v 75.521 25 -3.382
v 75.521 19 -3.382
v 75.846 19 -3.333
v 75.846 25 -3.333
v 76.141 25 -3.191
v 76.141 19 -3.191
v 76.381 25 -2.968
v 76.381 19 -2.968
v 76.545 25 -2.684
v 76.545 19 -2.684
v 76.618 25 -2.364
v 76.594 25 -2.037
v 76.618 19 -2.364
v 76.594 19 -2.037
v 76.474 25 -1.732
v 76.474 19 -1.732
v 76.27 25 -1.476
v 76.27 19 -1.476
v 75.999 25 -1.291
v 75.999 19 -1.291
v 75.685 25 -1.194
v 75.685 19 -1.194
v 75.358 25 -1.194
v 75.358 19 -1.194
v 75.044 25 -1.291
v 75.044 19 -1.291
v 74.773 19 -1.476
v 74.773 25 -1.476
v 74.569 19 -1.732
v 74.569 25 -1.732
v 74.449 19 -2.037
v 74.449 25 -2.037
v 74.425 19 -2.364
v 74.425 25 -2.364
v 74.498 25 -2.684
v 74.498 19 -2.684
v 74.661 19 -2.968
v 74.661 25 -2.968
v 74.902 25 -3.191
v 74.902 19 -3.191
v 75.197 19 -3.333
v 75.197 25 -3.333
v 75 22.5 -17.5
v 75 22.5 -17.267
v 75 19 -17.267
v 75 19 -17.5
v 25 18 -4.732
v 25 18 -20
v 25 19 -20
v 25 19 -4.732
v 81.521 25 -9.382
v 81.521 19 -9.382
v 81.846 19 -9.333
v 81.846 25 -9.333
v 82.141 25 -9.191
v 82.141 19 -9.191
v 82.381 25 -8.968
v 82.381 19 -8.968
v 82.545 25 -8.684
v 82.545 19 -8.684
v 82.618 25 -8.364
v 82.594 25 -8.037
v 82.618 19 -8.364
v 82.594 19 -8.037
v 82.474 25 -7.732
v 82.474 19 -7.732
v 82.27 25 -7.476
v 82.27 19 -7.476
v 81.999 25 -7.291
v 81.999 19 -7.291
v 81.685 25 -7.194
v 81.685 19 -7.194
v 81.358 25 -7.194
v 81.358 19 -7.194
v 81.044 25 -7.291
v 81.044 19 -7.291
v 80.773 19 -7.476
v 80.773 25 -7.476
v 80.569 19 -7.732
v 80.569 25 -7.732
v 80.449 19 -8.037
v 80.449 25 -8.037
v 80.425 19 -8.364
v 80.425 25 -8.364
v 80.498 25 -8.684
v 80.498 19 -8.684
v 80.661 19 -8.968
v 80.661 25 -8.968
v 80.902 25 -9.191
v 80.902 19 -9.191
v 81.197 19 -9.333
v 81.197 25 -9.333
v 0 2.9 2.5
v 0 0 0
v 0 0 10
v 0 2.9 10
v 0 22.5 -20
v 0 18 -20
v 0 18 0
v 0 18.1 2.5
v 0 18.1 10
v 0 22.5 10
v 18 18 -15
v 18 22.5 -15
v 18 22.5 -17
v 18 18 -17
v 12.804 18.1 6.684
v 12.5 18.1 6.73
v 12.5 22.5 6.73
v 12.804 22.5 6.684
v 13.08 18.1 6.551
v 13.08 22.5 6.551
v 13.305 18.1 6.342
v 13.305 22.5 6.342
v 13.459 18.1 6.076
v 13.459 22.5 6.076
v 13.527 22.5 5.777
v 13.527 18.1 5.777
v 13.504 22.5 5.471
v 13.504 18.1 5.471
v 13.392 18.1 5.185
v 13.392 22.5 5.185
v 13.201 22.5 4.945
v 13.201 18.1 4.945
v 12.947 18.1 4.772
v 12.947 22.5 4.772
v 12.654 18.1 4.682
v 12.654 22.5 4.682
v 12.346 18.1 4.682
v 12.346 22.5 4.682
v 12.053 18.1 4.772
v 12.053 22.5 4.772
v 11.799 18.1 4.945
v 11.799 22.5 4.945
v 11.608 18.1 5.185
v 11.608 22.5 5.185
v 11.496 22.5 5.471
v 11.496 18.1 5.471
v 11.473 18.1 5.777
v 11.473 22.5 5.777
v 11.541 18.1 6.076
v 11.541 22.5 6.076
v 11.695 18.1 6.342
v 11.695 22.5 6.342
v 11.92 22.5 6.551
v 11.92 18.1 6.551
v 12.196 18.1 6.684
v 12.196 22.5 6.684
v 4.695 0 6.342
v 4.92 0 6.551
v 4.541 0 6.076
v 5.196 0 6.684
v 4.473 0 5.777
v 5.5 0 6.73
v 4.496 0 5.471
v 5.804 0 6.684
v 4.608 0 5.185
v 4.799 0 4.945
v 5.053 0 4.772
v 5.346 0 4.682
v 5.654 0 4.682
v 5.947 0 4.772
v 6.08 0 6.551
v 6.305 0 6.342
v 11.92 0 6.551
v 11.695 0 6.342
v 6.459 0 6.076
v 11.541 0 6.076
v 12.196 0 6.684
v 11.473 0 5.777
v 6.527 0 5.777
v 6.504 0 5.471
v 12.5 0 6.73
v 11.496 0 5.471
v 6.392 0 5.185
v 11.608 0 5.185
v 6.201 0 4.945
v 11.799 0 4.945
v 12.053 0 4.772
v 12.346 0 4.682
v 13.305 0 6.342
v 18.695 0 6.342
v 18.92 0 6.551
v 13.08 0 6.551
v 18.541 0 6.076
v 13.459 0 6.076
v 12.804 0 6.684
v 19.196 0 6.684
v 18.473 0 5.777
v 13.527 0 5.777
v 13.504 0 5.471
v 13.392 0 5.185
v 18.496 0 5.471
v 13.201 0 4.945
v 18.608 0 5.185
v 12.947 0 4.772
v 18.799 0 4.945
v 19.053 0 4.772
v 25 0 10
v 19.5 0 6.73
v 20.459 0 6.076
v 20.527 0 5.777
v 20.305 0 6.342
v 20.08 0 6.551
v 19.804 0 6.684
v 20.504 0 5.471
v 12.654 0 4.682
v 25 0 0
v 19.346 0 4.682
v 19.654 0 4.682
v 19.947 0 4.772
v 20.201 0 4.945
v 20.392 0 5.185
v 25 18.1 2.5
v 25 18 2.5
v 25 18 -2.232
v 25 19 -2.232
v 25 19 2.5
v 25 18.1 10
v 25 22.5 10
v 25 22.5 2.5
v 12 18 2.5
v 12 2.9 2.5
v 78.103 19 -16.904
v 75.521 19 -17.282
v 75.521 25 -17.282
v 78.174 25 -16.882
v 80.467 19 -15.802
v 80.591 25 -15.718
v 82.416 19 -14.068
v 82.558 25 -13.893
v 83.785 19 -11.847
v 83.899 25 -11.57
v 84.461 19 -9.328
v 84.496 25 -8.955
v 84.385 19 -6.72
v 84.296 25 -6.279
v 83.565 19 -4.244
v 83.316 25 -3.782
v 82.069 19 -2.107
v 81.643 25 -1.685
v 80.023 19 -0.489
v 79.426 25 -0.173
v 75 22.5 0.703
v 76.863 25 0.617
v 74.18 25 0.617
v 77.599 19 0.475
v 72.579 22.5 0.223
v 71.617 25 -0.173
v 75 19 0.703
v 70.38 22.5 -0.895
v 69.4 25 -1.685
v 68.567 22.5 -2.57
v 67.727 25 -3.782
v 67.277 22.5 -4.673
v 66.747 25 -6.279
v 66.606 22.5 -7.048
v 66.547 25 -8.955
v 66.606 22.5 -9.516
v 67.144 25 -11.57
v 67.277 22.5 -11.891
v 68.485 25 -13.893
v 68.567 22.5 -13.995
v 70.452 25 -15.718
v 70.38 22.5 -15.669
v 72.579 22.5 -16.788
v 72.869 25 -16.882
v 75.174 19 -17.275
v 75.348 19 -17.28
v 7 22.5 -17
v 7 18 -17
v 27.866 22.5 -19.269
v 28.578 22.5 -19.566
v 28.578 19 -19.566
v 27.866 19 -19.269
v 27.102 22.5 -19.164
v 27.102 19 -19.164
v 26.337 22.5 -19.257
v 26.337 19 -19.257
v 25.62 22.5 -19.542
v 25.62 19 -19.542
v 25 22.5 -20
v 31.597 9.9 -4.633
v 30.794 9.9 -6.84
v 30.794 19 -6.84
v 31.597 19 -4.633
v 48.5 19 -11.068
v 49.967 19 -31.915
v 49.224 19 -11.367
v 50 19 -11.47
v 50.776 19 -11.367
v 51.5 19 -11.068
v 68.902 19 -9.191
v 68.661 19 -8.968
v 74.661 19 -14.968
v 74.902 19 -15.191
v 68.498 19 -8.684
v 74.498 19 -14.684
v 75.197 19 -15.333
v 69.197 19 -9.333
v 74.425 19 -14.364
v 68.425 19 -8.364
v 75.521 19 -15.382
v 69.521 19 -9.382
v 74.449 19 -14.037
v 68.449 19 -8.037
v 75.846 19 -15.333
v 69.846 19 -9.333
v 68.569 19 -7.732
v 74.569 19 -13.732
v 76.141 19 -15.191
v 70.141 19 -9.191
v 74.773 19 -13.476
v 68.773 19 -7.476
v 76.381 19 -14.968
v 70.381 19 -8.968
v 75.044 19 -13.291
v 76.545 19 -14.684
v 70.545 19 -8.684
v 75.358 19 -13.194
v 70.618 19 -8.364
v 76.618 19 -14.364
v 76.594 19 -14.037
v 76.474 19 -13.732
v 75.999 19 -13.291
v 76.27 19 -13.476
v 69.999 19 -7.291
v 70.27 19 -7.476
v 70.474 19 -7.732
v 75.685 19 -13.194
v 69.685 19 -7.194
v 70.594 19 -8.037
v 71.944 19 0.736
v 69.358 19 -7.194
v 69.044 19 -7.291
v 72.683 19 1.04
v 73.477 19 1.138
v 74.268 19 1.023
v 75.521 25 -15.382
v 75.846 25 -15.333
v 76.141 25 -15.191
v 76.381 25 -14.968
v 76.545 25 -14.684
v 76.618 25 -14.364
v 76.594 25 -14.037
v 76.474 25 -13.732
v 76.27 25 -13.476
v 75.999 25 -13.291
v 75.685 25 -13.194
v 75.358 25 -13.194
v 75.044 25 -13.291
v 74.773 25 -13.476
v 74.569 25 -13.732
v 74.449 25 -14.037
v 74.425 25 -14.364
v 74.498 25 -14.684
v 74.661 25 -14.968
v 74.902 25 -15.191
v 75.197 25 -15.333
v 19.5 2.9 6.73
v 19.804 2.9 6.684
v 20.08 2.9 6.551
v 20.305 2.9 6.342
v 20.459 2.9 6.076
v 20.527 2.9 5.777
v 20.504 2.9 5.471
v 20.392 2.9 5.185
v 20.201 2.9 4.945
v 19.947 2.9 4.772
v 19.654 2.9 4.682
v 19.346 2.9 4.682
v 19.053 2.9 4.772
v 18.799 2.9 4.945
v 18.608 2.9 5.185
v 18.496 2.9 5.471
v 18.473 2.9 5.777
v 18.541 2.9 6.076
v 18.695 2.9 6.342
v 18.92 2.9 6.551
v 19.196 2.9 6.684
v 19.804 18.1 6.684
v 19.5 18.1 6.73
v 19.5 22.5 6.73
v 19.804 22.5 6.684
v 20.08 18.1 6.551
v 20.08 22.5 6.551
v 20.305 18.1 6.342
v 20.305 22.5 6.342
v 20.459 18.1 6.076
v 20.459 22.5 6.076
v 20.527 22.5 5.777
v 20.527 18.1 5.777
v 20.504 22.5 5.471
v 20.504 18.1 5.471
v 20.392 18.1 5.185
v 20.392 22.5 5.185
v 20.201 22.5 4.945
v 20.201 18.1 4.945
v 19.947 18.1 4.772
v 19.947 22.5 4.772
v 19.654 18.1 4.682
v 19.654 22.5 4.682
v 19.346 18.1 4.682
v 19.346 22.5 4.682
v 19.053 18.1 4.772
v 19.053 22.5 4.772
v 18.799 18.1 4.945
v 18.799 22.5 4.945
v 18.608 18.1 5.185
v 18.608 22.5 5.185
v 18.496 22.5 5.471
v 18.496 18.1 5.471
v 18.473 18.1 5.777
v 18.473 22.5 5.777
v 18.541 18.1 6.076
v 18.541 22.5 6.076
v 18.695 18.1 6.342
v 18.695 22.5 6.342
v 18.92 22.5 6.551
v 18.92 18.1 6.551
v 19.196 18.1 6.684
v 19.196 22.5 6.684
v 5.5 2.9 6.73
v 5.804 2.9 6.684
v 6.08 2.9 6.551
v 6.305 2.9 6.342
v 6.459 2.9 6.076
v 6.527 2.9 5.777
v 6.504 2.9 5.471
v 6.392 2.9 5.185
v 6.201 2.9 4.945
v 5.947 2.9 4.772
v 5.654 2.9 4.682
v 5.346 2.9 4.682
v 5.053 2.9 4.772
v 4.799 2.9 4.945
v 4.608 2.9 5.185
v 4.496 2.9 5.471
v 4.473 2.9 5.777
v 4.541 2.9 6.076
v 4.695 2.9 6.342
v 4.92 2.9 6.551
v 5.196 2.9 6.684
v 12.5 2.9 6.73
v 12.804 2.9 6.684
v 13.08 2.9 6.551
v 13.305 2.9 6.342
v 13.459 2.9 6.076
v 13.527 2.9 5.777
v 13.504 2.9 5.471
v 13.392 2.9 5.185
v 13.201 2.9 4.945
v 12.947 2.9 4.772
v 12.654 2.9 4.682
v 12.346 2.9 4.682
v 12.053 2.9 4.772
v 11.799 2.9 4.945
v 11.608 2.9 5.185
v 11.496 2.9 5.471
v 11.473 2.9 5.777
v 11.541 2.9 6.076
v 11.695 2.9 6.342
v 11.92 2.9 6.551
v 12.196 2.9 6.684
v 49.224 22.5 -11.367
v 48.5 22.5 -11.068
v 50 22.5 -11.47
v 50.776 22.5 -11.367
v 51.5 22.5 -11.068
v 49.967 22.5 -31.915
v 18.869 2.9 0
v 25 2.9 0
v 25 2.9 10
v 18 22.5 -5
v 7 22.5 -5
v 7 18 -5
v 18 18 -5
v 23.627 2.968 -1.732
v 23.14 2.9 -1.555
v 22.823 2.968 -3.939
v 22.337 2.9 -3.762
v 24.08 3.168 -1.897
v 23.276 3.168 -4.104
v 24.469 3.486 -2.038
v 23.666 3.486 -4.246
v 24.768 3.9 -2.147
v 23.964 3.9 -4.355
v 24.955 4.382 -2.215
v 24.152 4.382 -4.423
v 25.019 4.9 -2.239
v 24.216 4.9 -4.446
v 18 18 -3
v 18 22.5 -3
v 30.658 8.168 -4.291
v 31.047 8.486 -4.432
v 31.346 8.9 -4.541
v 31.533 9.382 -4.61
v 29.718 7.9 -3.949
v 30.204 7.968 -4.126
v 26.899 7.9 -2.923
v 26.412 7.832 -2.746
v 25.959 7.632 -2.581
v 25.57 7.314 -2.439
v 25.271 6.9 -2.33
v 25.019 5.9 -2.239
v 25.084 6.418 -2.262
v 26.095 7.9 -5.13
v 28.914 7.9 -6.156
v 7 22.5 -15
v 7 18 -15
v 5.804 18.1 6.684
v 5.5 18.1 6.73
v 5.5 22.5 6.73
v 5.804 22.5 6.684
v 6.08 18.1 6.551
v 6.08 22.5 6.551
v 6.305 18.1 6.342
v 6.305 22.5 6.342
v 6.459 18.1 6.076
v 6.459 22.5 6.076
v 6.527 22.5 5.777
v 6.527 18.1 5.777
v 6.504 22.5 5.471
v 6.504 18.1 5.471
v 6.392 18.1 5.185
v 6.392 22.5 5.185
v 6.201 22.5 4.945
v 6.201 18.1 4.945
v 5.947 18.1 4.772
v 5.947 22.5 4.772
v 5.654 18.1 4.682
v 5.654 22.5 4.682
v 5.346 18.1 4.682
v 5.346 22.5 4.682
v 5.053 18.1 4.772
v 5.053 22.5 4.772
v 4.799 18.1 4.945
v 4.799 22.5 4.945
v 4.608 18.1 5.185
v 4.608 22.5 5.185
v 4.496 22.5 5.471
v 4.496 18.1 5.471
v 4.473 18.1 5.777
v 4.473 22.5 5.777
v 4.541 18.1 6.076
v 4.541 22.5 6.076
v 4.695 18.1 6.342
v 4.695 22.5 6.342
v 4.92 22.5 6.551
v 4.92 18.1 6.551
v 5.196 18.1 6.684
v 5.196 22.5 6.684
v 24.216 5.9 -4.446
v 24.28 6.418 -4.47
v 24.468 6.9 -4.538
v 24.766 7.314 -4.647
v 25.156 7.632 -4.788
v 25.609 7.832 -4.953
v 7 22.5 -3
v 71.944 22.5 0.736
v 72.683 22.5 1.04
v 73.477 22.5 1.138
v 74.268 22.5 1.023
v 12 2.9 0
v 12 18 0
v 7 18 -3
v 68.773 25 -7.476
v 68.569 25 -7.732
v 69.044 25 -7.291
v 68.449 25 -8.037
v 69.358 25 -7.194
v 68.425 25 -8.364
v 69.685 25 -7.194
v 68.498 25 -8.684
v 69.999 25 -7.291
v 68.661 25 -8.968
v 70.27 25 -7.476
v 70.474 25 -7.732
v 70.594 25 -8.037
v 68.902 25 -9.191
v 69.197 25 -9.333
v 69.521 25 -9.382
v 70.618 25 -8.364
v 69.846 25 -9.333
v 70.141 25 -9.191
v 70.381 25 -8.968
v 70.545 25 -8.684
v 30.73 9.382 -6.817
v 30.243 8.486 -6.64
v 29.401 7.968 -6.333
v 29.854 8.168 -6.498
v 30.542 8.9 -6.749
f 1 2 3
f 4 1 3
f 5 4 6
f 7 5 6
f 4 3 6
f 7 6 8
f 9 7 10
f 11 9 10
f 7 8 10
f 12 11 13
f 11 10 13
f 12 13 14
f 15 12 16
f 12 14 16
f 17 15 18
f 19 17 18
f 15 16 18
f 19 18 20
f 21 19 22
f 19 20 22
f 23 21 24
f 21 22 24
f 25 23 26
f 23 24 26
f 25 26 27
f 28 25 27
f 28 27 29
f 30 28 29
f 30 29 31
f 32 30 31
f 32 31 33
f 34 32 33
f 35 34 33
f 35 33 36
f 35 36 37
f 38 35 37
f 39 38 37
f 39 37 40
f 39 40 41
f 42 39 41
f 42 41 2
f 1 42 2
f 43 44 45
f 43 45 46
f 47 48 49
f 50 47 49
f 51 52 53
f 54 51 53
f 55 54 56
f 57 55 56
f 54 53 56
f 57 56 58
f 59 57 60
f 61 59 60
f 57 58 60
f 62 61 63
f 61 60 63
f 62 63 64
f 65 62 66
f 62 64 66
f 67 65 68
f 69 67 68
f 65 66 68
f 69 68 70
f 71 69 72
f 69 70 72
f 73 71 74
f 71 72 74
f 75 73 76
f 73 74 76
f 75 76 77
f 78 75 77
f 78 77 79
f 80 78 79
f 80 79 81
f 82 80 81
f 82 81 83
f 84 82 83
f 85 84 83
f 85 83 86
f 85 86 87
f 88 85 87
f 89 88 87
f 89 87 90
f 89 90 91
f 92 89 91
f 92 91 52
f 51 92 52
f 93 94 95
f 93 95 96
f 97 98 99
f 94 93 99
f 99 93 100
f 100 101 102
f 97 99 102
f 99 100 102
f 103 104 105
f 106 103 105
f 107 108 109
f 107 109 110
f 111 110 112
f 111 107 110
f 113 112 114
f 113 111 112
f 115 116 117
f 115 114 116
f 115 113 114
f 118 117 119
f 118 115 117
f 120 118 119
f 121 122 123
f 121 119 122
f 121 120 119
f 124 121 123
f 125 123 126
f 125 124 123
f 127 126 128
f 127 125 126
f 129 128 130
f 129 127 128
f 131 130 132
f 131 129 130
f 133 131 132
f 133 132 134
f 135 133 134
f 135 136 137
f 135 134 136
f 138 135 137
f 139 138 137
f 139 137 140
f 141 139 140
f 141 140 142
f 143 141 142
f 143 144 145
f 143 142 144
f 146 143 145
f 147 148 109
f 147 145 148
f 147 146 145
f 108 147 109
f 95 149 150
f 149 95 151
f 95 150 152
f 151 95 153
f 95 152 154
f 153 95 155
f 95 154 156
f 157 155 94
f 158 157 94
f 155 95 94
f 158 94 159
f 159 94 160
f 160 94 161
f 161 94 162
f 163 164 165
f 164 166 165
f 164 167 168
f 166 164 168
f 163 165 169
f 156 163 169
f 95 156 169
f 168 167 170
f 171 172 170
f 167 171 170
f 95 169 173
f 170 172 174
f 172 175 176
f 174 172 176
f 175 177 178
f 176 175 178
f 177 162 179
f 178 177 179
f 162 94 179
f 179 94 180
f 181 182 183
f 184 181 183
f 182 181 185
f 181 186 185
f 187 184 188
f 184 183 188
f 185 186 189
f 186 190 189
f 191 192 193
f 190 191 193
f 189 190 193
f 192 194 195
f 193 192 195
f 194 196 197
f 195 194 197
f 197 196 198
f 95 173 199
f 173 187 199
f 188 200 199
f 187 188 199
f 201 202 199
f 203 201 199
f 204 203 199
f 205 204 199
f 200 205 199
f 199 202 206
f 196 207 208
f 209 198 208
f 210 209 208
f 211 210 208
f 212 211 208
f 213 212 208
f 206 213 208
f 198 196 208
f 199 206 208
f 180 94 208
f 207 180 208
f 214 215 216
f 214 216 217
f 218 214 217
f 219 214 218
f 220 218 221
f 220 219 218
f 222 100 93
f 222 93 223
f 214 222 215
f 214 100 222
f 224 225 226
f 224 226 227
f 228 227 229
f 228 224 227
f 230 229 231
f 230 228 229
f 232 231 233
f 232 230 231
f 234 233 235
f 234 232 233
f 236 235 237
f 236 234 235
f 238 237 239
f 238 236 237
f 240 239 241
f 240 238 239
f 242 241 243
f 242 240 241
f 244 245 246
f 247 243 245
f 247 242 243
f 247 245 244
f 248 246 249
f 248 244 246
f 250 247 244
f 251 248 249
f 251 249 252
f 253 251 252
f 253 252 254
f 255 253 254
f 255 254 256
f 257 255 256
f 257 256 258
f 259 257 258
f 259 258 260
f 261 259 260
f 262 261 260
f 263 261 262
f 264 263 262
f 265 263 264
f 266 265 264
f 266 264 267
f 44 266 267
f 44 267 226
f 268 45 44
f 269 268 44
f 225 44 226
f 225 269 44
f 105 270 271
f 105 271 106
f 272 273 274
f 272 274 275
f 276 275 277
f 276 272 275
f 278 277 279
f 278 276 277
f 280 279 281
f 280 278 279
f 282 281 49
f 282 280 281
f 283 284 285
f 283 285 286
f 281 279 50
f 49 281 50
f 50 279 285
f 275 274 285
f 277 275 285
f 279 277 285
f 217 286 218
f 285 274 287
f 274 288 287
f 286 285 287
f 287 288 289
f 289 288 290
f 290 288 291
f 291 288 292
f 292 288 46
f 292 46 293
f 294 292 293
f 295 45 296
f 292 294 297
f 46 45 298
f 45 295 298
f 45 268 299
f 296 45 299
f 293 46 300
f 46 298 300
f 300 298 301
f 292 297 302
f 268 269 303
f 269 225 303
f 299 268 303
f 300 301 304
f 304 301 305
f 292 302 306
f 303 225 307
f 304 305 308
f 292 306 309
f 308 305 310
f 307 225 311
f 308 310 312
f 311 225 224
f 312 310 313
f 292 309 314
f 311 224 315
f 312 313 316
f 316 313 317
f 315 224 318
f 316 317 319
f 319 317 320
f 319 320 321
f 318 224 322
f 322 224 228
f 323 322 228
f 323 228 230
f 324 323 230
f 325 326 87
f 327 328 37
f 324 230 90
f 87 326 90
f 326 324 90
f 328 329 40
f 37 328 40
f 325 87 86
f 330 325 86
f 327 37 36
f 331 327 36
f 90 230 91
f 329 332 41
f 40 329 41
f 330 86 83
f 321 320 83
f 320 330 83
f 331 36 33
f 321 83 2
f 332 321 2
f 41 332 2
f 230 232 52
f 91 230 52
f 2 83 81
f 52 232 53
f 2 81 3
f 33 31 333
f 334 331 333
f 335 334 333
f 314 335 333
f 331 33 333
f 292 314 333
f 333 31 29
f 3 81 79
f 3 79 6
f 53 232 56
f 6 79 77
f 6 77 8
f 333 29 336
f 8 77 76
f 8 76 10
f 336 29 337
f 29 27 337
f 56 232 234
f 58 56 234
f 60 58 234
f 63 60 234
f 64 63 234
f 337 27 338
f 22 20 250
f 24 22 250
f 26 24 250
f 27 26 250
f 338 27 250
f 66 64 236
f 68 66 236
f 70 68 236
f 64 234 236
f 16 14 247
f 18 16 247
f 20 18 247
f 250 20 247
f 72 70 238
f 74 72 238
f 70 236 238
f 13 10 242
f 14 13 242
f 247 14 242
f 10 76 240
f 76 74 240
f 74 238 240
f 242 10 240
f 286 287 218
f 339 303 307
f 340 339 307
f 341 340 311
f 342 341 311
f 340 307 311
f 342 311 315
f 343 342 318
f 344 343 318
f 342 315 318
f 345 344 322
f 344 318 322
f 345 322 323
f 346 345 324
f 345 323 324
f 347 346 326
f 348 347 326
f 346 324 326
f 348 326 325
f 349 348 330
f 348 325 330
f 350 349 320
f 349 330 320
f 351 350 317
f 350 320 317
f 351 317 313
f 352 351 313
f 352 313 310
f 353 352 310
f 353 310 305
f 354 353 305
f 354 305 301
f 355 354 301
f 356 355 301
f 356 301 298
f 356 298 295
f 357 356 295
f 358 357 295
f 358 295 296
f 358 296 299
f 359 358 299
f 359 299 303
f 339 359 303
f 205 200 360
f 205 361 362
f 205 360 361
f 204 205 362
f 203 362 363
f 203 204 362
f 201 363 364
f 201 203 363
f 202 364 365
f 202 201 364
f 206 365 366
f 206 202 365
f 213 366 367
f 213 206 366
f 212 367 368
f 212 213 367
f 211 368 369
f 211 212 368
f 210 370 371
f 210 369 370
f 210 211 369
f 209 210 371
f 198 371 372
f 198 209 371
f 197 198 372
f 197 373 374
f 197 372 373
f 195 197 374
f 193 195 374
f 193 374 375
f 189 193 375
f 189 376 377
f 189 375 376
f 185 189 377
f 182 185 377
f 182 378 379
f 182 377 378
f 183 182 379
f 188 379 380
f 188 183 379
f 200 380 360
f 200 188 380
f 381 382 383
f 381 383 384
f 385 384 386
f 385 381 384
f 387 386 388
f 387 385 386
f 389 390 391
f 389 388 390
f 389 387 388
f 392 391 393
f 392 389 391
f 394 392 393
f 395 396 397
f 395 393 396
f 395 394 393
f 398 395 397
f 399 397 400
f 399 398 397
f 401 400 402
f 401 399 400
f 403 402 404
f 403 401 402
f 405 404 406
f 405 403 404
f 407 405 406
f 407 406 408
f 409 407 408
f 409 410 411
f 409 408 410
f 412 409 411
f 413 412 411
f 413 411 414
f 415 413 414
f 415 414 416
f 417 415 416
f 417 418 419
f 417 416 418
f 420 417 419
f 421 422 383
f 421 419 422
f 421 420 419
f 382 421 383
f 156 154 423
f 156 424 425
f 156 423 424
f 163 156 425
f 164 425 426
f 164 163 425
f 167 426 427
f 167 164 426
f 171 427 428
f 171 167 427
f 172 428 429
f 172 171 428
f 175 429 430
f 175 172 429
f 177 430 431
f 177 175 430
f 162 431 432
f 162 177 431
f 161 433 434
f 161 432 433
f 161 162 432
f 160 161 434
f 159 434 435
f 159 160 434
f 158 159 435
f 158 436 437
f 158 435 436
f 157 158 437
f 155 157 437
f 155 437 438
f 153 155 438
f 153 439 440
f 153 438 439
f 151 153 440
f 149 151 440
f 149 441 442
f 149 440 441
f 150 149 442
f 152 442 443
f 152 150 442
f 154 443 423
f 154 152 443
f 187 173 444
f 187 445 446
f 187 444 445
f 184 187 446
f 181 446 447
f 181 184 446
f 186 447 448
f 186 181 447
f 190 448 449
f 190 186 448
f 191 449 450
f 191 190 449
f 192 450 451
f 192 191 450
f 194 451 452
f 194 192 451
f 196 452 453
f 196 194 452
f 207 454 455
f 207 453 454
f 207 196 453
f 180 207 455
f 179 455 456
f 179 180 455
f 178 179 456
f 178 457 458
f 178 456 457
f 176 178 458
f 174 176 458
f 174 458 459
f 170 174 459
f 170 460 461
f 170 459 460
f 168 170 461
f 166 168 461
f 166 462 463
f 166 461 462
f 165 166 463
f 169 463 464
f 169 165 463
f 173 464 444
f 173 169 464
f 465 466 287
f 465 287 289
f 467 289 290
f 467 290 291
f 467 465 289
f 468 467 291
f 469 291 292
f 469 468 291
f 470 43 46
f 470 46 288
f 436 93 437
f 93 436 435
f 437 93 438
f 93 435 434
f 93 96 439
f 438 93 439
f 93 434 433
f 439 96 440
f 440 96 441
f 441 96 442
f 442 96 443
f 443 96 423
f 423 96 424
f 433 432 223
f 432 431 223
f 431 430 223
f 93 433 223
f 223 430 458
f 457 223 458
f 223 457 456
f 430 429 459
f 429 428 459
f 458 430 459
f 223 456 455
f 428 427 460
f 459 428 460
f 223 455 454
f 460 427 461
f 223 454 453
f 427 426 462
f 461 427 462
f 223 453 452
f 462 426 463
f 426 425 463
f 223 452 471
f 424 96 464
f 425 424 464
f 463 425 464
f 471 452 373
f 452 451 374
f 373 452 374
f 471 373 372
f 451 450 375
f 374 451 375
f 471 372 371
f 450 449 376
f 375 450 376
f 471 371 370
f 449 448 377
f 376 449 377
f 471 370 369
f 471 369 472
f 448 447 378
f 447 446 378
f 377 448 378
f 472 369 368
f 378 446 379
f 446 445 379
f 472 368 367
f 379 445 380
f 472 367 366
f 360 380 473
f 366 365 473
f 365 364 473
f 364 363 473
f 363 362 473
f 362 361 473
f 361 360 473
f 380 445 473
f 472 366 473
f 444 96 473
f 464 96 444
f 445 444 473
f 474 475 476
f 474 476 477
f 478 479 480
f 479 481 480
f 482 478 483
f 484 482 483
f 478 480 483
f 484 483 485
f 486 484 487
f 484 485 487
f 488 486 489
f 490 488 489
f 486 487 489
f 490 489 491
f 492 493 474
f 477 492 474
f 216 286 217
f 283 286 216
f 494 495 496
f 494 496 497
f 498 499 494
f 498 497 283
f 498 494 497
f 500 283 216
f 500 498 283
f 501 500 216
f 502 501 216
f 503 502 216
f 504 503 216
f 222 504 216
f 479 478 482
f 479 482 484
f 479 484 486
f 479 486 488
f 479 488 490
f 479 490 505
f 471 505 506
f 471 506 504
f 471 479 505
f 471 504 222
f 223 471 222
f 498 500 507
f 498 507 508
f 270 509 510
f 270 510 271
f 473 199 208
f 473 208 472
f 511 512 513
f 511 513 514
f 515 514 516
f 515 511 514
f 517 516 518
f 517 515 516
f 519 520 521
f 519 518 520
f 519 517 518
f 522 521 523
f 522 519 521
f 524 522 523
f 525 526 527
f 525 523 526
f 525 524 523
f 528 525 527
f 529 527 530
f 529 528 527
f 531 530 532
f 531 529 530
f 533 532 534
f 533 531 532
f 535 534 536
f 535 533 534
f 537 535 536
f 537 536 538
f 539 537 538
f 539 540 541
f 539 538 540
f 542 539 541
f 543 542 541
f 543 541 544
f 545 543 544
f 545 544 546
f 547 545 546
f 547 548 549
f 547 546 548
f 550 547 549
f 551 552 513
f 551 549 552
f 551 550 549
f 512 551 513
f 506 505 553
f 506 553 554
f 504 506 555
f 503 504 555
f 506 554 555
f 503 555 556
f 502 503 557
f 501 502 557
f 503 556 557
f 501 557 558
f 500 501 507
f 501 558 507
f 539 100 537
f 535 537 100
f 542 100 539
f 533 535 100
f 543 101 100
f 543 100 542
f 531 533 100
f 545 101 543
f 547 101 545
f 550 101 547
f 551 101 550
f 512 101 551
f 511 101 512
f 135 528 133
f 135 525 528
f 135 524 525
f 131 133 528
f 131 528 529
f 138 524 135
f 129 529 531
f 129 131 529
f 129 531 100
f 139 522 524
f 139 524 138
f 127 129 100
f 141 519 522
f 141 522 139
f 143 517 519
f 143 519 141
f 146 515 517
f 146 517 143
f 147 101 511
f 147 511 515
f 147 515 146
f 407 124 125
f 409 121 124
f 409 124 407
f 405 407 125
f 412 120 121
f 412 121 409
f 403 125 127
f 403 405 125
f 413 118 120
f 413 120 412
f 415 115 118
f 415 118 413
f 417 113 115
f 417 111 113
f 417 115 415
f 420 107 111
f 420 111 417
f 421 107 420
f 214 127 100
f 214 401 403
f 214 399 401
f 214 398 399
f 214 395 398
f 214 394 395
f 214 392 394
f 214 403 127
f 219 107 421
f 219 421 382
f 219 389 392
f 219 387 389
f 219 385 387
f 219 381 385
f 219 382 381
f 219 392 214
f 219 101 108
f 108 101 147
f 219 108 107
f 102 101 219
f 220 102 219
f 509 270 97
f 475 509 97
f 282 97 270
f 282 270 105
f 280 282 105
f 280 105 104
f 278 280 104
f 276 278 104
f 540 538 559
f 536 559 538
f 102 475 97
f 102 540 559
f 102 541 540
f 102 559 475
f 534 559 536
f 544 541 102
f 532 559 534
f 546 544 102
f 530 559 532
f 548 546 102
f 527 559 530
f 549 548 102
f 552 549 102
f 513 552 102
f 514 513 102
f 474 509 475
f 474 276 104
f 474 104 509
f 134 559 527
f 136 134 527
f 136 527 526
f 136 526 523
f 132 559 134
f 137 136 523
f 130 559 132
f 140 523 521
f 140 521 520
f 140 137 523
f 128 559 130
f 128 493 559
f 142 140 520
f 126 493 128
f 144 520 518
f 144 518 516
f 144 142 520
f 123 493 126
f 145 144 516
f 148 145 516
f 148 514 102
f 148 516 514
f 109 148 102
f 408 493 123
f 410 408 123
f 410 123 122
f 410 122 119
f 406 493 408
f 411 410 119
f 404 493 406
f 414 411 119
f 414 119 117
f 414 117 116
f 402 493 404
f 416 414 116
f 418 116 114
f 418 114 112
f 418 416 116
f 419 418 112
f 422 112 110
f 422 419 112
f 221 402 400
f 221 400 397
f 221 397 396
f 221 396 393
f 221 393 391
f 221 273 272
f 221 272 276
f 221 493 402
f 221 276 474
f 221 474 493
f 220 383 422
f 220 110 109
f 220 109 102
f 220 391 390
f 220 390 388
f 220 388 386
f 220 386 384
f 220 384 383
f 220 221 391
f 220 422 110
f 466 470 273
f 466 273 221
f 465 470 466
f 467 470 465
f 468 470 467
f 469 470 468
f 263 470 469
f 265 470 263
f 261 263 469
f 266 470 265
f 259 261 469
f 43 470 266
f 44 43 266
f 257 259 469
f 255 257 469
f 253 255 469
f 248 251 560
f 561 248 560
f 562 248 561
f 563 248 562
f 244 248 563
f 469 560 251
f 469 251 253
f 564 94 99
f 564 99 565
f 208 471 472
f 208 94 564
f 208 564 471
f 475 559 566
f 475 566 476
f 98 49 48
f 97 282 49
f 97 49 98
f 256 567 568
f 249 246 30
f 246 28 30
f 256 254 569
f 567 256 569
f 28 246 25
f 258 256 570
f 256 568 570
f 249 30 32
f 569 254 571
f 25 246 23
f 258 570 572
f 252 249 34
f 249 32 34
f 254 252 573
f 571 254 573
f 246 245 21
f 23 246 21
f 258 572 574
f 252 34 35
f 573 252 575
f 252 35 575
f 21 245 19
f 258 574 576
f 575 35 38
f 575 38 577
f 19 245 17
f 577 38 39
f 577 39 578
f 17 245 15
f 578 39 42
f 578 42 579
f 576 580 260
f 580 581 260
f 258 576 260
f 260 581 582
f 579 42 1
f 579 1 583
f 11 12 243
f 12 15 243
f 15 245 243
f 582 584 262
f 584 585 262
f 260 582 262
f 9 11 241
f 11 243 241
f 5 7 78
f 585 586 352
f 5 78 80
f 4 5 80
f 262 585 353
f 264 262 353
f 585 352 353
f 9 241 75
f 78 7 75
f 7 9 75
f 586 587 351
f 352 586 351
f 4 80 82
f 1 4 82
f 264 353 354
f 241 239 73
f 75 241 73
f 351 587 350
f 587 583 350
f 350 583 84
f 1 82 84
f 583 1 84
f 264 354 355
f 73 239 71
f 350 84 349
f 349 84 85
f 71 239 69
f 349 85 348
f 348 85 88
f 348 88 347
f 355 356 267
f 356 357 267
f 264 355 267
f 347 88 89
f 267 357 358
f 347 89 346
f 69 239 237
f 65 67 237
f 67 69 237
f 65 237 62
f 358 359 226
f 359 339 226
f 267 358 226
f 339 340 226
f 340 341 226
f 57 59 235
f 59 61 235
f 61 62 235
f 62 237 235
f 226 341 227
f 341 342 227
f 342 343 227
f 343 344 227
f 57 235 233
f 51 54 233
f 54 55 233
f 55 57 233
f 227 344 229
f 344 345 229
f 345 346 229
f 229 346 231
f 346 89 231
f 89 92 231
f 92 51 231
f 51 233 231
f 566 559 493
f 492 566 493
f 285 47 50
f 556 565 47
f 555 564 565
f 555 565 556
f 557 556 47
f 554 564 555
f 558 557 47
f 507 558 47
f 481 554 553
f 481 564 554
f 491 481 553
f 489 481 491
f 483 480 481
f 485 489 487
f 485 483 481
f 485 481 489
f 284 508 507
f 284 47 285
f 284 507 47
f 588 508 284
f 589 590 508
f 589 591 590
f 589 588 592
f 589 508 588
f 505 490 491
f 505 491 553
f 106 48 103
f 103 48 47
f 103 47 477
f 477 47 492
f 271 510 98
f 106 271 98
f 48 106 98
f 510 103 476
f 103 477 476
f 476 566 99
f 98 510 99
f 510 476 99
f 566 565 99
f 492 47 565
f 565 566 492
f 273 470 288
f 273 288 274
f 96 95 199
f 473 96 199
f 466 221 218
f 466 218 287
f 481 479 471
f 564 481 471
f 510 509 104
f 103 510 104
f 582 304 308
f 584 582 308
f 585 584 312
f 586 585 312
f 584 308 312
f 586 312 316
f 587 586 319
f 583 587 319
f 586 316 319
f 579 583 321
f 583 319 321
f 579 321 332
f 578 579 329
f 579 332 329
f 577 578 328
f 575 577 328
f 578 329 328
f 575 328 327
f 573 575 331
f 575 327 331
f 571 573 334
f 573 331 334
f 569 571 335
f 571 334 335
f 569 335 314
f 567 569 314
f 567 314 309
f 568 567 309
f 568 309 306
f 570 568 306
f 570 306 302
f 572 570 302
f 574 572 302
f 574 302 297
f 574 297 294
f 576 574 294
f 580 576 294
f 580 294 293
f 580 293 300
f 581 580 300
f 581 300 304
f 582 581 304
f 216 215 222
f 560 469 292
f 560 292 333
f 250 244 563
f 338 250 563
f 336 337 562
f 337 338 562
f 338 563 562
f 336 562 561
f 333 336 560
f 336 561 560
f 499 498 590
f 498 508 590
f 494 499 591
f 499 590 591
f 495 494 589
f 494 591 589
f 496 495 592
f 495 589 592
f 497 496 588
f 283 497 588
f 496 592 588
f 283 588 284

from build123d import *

# Parameters (mm, degrees)
SKETCH_1_W               = 25
SKETCH_1_H               = 10
EXTRUDE_1_DEPTH          = 22.5
SKETCH_2_W               = 25
SKETCH_2_H               = 15.2
CUT_EXTRUDE_1_DEPTH      = 7.5
CUT_EXTRUDE_2_DEPTH      = 36.089172119
CUT_EXTRUDE_2_DEPTH_BACK = 36.089172119
SKETCH_4_R               = 1.03
SKETCH_5_W               = 25
SKETCH_5_H               = 4.5
EXTRUDE_2_DEPTH          = 20
SKETCH_6_W               = 11
SKETCH_6_H               = 2
CUT_EXTRUDE_3_DEPTH      = 4.5
EXTRUDE_3_DEPTH          = 3.5
SKETCH_16_R              = 9
EXTRUDE_4_DEPTH          = 6
FILLET_1_R               = 3
CUT_EXTRUDE_4_REACH      = 94.322
SKETCH_17_R              = 1.1
SKETCH_19_W              = 13
SKETCH_19_H              = 15.1
CUT_EXTRUDE_5_DEPTH      = 10
EXTRUDE_5_REACH          = 95.01
CUT_EXTRUDE_6_REACH      = 96.037
SKETCH_22_W              = 7
SKETCH_22_H              = 5
FILLET_3_R               = 2


with BuildPart() as part:
    # 草图1 → 凸台-拉伸1 (new body)
    with BuildSketch(Plane(origin=(0, 0, 0), x_dir=(1, 0, 0), z_dir=(0, 1, 0))):
        with Locations((12.5, -5)):
            Rectangle(SKETCH_1_W, SKETCH_1_H)
    extrude(amount=EXTRUDE_1_DEPTH)

    # 草图2 → 切除-拉伸1 (cut)
    with BuildSketch(Plane.XY.offset(10)):
        with Locations((12.5, 10.5)):
            Rectangle(SKETCH_2_W, SKETCH_2_H)
    extrude(amount=-CUT_EXTRUDE_1_DEPTH, mode=Mode.SUBTRACT)

    # 草图4 → 切除-拉伸2 (cut, two sides: drawn at the far end of the back side and taken through both)
    with BuildSketch(Plane(origin=(0, 22.5, 0), x_dir=(1, 0, 0), z_dir=(0, 1, 0)).offset(-CUT_EXTRUDE_2_DEPTH_BACK)):
        with Locations(Location((12.5, -5.7, 0), (0, 0, 270))):
            Circle(SKETCH_4_R)
        with Locations(Location((19.5, -5.7, 0), (0, 0, 270))):
            Circle(SKETCH_4_R)
        with Locations(Location((5.5, -5.7, 0), (0, 0, 270))):
            Circle(SKETCH_4_R)
    extrude(amount=CUT_EXTRUDE_2_DEPTH + CUT_EXTRUDE_2_DEPTH_BACK, mode=Mode.SUBTRACT)

    # 草图5 → 凸台-拉伸2 (add)
    with BuildSketch(Plane(origin=(0, 0, 0), x_dir=(-1, 0, 0), z_dir=(0, 0, -1))):
        with Locations((-12.5, 20.25)):
            Rectangle(SKETCH_5_W, SKETCH_5_H)
    extrude(amount=EXTRUDE_2_DEPTH)

    # 草图6 → 切除-拉伸3 (cut)
    with BuildSketch(Plane(origin=(0, 22.5, 0), x_dir=(1, 0, 0), z_dir=(0, 1, 0))):
        with Locations((12.5, 16)):
            Rectangle(SKETCH_6_W, SKETCH_6_H)
        with Locations((12.5, 4)):
            Rectangle(SKETCH_6_W, SKETCH_6_H)
    extrude(amount=-CUT_EXTRUDE_3_DEPTH, mode=Mode.SUBTRACT)

    # 草图15 → 凸台-拉伸3 (add)
    with BuildSketch(Plane(origin=(0, 22.5, 0), x_dir=(1, 0, 0), z_dir=(0, 1, 0))):
        Polygon((25, -2.5), (50, 11.93375673), (75, -2.5), (75, 17.5), (49.967235844, 31.914840335), (25, 17.5), align=None)
    extrude(amount=-EXTRUDE_3_DEPTH)

    # 草图16 → 凸台-拉伸4 (add)
    with BuildSketch(Plane.XZ.offset(-19)):
        with Locations(Location((75.52146997, -8.282050808, 0), (0, 0, 270))):
            Circle(SKETCH_16_R)
    extrude(amount=-EXTRUDE_4_DEPTH)

    # 圆角1
    # the kernel refuses this fillet: 3 mm, written as the material it adds along each edge
    with BuildSketch(Plane(origin=(50, 22.5, -11.93375673), x_dir=(-0.8660254037844394, 0, 0.4999999999999987), z_dir=(0, -1, 0))) as fillet_1_piece_1:
        with BuildLine():
            CenterArc((FILLET_1_R * 0.57735026919, -FILLET_1_R), FILLET_1_R, 90, 60)
            Line((-FILLET_1_R * 0.288675134595, -FILLET_1_R * 0.5), (-FILLET_1_R * 0.305995642671, -FILLET_1_R * 0.49))
            Line((-FILLET_1_R * 0.305995642671, -FILLET_1_R * 0.49), (-FILLET_1_R * 0.0115470053838, FILLET_1_R * 0.02))
            Line((-FILLET_1_R * 0.0115470053838, FILLET_1_R * 0.02), (FILLET_1_R * 0.57735026919, FILLET_1_R * 0.02))
            Line((FILLET_1_R * 0.57735026919, FILLET_1_R * 0.02), (FILLET_1_R * 0.57735026919, 0))
        make_face()
    extrude(amount=3.5)
    with BuildSketch(Plane(origin=(25, 22.5, -17.5), x_dir=(0, 0, -1), z_dir=(0, -1, 0))) as fillet_1_piece_2:
        with BuildLine():
            CenterArc((4.663812226, 2.077959733), FILLET_1_R, 150, 73.840504848)
            Line((2.065736015, 3.577959733), (2.013774491, 3.607959733))
            Line((2.013774491, 3.607959733), (-0.051961524, 0.03))
            Line((-0.051961524, 0.03), (0, -0.06))
            ThreePointArc((0, -0.06), (1.25, -0.06), (2.456723755, -0.041559195))
            Line((2.456723755, -0.041559195), (2.5, 0))
        make_face()
    extrude(amount=3.5)
    # the kernel refuses this fillet: 3 mm, written as the material it takes off along each edge
    with BuildSketch(Plane(origin=(75, 31.321038653, 2.5), x_dir=(0, 0, -1), z_dir=(0, -1, 0))) as fillet_1_2_piece_1:
        with BuildLine():
            CenterArc((4.362283942, -1.555697425), FILLET_1_R, 148.763902171, 61.236097829)
            Line((1.764207731, -3.055697425), (1.712246206, -3.085697425))
            Line((1.712246206, -3.085697425), (-0.051961524, -0.03))
            Line((-0.051961524, -0.03), (0, 0.06))
            ThreePointArc((0, 0.06), (0.898585391, 0.06), (1.745868519, 0.031113948))
            Line((1.745868519, 0.031113948), (1.797170782, 0))
        make_face()
    extrude(amount=21.142077307, mode=Mode.SUBTRACT)

    # 草图17 → 切除-拉伸4 (cut, up to next)
    with BuildSketch(Plane.XZ.offset(-19), mode=Mode.PRIVATE) as cut_extrude_4_sk1:
        with Locations(Location((75.521469969, -14.282050811, 0), (0, 0, 270))):
            Circle(SKETCH_17_R)
    cut_extrude_4_tool1 = extrude(cut_extrude_4_sk1.sketch, amount=-CUT_EXTRUDE_4_REACH, mode=Mode.PRIVATE) & part.part
    # 草图17 → 切除-拉伸4 (cut, up to next)
    with BuildSketch(Plane.XZ.offset(-19), mode=Mode.PRIVATE) as cut_extrude_4_sk2:
        with Locations(Location((75.521469969, -2.282050808, 0), (0, 0, 270))):
            Circle(SKETCH_17_R)
    cut_extrude_4_tool2 = extrude(cut_extrude_4_sk2.sketch, amount=-CUT_EXTRUDE_4_REACH, mode=Mode.PRIVATE) & part.part
    # 草图17 → 切除-拉伸4 (cut, up to next)
    with BuildSketch(Plane.XZ.offset(-19), mode=Mode.PRIVATE) as cut_extrude_4_sk3:
        with Locations(Location((69.521469967, -8.282050809, 0), (0, 0, 270))):
            Circle(SKETCH_17_R)
    cut_extrude_4_tool3 = extrude(cut_extrude_4_sk3.sketch, amount=-CUT_EXTRUDE_4_REACH, mode=Mode.PRIVATE) & part.part
    # 草图17 → 切除-拉伸4 (cut, up to next)
    with BuildSketch(Plane.XZ.offset(-19), mode=Mode.PRIVATE) as cut_extrude_4_sk4:
        with Locations(Location((81.52146997, -8.282050809, 0), (0, 0, 270))):
            Circle(SKETCH_17_R)
    cut_extrude_4_tool4 = extrude(cut_extrude_4_sk4.sketch, amount=-CUT_EXTRUDE_4_REACH, mode=Mode.PRIVATE) & part.part
    add(cut_extrude_4_tool1.solids().sort_by_distance((75.52147, 19, -14.282051))[0], mode=Mode.SUBTRACT)
    add(cut_extrude_4_tool2.solids().sort_by_distance((75.52147, 19, -2.282051))[0], mode=Mode.SUBTRACT)
    add(cut_extrude_4_tool3.solids().sort_by_distance((69.52147, 19, -8.282051))[0], mode=Mode.SUBTRACT)
    add(cut_extrude_4_tool4.solids().sort_by_distance((81.52147, 19, -8.282051))[0], mode=Mode.SUBTRACT)

    # 草图19 → 切除-拉伸5 (cut)
    with BuildSketch(Plane(origin=(0, 0, 0), x_dir=(-1, 0, 0), z_dir=(0, 0, -1))):
        with Locations((-18.5, 10.45)):
            Rectangle(SKETCH_19_W, SKETCH_19_H)
    extrude(amount=-CUT_EXTRUDE_5_DEPTH, mode=Mode.SUBTRACT)

    # 凸台-拉伸5: up to this face of the body (flat: up to its plane)
    extrude_5_end = Plane(part.part.faces().sort_by_distance((53.082748758, 19, -14.052317246))[0])
    # 草图21 → 凸台-拉伸5 (add, up to the picked face)
    with BuildSketch(Plane(origin=(0, 2.9, 0), x_dir=(1, 0, 0), z_dir=(0, 1, 0)), mode=Mode.PRIVATE) as extrude_5_sk1:
        Polygon((12, -2.5), (12, 0), (30.793852416, 6.840402867), (31.597336928, 4.632847313), align=None)
    extrude_5_tool1 = split(extrude(extrude_5_sk1.sketch, amount=EXTRUDE_5_REACH, mode=Mode.PRIVATE), bisect_by=extrude_5_end, keep=Keep.BOTH, mode=Mode.PRIVATE)
    add(extrude_5_tool1.solids().sort_by(Axis((21.599199, 2.9, -2.235102), (0, 1, 0)))[0])

    # 草图22 → 切除-拉伸6 (cut, up to next)
    with BuildSketch(Plane(origin=(2.207217853, 0, 6.064281212), x_dir=(0.9396926207859104, 0, -0.3420201433256632), z_dir=(0.3420201433256632, 0, 0.9396926207859104)), mode=Mode.PRIVATE) as cut_extrude_6_sk1:
        with Locations((27.776311449, 5.4)):
            Rectangle(SKETCH_22_W, SKETCH_22_H)
    cut_extrude_6_tool1 = extrude(cut_extrude_6_sk1.sketch, amount=-CUT_EXTRUDE_6_REACH, mode=Mode.PRIVATE) & part.part
    add(cut_extrude_6_tool1.solids().sort_by_distance((28.308413, 5.4, -3.435777))[0], mode=Mode.SUBTRACT)

    # 圆角3
    fillet_3_edges = [part.edges().sort_by_distance(p)[0] for p in [
        (31.195594672, 7.9, -5.73662509),
        (24.617746326, 2.9, -3.342484086),
        (24.617746326, 7.9, -3.342484086),
    ]]
    fillet(fillet_3_edges, radius=FILLET_3_R)


solid = part.part
